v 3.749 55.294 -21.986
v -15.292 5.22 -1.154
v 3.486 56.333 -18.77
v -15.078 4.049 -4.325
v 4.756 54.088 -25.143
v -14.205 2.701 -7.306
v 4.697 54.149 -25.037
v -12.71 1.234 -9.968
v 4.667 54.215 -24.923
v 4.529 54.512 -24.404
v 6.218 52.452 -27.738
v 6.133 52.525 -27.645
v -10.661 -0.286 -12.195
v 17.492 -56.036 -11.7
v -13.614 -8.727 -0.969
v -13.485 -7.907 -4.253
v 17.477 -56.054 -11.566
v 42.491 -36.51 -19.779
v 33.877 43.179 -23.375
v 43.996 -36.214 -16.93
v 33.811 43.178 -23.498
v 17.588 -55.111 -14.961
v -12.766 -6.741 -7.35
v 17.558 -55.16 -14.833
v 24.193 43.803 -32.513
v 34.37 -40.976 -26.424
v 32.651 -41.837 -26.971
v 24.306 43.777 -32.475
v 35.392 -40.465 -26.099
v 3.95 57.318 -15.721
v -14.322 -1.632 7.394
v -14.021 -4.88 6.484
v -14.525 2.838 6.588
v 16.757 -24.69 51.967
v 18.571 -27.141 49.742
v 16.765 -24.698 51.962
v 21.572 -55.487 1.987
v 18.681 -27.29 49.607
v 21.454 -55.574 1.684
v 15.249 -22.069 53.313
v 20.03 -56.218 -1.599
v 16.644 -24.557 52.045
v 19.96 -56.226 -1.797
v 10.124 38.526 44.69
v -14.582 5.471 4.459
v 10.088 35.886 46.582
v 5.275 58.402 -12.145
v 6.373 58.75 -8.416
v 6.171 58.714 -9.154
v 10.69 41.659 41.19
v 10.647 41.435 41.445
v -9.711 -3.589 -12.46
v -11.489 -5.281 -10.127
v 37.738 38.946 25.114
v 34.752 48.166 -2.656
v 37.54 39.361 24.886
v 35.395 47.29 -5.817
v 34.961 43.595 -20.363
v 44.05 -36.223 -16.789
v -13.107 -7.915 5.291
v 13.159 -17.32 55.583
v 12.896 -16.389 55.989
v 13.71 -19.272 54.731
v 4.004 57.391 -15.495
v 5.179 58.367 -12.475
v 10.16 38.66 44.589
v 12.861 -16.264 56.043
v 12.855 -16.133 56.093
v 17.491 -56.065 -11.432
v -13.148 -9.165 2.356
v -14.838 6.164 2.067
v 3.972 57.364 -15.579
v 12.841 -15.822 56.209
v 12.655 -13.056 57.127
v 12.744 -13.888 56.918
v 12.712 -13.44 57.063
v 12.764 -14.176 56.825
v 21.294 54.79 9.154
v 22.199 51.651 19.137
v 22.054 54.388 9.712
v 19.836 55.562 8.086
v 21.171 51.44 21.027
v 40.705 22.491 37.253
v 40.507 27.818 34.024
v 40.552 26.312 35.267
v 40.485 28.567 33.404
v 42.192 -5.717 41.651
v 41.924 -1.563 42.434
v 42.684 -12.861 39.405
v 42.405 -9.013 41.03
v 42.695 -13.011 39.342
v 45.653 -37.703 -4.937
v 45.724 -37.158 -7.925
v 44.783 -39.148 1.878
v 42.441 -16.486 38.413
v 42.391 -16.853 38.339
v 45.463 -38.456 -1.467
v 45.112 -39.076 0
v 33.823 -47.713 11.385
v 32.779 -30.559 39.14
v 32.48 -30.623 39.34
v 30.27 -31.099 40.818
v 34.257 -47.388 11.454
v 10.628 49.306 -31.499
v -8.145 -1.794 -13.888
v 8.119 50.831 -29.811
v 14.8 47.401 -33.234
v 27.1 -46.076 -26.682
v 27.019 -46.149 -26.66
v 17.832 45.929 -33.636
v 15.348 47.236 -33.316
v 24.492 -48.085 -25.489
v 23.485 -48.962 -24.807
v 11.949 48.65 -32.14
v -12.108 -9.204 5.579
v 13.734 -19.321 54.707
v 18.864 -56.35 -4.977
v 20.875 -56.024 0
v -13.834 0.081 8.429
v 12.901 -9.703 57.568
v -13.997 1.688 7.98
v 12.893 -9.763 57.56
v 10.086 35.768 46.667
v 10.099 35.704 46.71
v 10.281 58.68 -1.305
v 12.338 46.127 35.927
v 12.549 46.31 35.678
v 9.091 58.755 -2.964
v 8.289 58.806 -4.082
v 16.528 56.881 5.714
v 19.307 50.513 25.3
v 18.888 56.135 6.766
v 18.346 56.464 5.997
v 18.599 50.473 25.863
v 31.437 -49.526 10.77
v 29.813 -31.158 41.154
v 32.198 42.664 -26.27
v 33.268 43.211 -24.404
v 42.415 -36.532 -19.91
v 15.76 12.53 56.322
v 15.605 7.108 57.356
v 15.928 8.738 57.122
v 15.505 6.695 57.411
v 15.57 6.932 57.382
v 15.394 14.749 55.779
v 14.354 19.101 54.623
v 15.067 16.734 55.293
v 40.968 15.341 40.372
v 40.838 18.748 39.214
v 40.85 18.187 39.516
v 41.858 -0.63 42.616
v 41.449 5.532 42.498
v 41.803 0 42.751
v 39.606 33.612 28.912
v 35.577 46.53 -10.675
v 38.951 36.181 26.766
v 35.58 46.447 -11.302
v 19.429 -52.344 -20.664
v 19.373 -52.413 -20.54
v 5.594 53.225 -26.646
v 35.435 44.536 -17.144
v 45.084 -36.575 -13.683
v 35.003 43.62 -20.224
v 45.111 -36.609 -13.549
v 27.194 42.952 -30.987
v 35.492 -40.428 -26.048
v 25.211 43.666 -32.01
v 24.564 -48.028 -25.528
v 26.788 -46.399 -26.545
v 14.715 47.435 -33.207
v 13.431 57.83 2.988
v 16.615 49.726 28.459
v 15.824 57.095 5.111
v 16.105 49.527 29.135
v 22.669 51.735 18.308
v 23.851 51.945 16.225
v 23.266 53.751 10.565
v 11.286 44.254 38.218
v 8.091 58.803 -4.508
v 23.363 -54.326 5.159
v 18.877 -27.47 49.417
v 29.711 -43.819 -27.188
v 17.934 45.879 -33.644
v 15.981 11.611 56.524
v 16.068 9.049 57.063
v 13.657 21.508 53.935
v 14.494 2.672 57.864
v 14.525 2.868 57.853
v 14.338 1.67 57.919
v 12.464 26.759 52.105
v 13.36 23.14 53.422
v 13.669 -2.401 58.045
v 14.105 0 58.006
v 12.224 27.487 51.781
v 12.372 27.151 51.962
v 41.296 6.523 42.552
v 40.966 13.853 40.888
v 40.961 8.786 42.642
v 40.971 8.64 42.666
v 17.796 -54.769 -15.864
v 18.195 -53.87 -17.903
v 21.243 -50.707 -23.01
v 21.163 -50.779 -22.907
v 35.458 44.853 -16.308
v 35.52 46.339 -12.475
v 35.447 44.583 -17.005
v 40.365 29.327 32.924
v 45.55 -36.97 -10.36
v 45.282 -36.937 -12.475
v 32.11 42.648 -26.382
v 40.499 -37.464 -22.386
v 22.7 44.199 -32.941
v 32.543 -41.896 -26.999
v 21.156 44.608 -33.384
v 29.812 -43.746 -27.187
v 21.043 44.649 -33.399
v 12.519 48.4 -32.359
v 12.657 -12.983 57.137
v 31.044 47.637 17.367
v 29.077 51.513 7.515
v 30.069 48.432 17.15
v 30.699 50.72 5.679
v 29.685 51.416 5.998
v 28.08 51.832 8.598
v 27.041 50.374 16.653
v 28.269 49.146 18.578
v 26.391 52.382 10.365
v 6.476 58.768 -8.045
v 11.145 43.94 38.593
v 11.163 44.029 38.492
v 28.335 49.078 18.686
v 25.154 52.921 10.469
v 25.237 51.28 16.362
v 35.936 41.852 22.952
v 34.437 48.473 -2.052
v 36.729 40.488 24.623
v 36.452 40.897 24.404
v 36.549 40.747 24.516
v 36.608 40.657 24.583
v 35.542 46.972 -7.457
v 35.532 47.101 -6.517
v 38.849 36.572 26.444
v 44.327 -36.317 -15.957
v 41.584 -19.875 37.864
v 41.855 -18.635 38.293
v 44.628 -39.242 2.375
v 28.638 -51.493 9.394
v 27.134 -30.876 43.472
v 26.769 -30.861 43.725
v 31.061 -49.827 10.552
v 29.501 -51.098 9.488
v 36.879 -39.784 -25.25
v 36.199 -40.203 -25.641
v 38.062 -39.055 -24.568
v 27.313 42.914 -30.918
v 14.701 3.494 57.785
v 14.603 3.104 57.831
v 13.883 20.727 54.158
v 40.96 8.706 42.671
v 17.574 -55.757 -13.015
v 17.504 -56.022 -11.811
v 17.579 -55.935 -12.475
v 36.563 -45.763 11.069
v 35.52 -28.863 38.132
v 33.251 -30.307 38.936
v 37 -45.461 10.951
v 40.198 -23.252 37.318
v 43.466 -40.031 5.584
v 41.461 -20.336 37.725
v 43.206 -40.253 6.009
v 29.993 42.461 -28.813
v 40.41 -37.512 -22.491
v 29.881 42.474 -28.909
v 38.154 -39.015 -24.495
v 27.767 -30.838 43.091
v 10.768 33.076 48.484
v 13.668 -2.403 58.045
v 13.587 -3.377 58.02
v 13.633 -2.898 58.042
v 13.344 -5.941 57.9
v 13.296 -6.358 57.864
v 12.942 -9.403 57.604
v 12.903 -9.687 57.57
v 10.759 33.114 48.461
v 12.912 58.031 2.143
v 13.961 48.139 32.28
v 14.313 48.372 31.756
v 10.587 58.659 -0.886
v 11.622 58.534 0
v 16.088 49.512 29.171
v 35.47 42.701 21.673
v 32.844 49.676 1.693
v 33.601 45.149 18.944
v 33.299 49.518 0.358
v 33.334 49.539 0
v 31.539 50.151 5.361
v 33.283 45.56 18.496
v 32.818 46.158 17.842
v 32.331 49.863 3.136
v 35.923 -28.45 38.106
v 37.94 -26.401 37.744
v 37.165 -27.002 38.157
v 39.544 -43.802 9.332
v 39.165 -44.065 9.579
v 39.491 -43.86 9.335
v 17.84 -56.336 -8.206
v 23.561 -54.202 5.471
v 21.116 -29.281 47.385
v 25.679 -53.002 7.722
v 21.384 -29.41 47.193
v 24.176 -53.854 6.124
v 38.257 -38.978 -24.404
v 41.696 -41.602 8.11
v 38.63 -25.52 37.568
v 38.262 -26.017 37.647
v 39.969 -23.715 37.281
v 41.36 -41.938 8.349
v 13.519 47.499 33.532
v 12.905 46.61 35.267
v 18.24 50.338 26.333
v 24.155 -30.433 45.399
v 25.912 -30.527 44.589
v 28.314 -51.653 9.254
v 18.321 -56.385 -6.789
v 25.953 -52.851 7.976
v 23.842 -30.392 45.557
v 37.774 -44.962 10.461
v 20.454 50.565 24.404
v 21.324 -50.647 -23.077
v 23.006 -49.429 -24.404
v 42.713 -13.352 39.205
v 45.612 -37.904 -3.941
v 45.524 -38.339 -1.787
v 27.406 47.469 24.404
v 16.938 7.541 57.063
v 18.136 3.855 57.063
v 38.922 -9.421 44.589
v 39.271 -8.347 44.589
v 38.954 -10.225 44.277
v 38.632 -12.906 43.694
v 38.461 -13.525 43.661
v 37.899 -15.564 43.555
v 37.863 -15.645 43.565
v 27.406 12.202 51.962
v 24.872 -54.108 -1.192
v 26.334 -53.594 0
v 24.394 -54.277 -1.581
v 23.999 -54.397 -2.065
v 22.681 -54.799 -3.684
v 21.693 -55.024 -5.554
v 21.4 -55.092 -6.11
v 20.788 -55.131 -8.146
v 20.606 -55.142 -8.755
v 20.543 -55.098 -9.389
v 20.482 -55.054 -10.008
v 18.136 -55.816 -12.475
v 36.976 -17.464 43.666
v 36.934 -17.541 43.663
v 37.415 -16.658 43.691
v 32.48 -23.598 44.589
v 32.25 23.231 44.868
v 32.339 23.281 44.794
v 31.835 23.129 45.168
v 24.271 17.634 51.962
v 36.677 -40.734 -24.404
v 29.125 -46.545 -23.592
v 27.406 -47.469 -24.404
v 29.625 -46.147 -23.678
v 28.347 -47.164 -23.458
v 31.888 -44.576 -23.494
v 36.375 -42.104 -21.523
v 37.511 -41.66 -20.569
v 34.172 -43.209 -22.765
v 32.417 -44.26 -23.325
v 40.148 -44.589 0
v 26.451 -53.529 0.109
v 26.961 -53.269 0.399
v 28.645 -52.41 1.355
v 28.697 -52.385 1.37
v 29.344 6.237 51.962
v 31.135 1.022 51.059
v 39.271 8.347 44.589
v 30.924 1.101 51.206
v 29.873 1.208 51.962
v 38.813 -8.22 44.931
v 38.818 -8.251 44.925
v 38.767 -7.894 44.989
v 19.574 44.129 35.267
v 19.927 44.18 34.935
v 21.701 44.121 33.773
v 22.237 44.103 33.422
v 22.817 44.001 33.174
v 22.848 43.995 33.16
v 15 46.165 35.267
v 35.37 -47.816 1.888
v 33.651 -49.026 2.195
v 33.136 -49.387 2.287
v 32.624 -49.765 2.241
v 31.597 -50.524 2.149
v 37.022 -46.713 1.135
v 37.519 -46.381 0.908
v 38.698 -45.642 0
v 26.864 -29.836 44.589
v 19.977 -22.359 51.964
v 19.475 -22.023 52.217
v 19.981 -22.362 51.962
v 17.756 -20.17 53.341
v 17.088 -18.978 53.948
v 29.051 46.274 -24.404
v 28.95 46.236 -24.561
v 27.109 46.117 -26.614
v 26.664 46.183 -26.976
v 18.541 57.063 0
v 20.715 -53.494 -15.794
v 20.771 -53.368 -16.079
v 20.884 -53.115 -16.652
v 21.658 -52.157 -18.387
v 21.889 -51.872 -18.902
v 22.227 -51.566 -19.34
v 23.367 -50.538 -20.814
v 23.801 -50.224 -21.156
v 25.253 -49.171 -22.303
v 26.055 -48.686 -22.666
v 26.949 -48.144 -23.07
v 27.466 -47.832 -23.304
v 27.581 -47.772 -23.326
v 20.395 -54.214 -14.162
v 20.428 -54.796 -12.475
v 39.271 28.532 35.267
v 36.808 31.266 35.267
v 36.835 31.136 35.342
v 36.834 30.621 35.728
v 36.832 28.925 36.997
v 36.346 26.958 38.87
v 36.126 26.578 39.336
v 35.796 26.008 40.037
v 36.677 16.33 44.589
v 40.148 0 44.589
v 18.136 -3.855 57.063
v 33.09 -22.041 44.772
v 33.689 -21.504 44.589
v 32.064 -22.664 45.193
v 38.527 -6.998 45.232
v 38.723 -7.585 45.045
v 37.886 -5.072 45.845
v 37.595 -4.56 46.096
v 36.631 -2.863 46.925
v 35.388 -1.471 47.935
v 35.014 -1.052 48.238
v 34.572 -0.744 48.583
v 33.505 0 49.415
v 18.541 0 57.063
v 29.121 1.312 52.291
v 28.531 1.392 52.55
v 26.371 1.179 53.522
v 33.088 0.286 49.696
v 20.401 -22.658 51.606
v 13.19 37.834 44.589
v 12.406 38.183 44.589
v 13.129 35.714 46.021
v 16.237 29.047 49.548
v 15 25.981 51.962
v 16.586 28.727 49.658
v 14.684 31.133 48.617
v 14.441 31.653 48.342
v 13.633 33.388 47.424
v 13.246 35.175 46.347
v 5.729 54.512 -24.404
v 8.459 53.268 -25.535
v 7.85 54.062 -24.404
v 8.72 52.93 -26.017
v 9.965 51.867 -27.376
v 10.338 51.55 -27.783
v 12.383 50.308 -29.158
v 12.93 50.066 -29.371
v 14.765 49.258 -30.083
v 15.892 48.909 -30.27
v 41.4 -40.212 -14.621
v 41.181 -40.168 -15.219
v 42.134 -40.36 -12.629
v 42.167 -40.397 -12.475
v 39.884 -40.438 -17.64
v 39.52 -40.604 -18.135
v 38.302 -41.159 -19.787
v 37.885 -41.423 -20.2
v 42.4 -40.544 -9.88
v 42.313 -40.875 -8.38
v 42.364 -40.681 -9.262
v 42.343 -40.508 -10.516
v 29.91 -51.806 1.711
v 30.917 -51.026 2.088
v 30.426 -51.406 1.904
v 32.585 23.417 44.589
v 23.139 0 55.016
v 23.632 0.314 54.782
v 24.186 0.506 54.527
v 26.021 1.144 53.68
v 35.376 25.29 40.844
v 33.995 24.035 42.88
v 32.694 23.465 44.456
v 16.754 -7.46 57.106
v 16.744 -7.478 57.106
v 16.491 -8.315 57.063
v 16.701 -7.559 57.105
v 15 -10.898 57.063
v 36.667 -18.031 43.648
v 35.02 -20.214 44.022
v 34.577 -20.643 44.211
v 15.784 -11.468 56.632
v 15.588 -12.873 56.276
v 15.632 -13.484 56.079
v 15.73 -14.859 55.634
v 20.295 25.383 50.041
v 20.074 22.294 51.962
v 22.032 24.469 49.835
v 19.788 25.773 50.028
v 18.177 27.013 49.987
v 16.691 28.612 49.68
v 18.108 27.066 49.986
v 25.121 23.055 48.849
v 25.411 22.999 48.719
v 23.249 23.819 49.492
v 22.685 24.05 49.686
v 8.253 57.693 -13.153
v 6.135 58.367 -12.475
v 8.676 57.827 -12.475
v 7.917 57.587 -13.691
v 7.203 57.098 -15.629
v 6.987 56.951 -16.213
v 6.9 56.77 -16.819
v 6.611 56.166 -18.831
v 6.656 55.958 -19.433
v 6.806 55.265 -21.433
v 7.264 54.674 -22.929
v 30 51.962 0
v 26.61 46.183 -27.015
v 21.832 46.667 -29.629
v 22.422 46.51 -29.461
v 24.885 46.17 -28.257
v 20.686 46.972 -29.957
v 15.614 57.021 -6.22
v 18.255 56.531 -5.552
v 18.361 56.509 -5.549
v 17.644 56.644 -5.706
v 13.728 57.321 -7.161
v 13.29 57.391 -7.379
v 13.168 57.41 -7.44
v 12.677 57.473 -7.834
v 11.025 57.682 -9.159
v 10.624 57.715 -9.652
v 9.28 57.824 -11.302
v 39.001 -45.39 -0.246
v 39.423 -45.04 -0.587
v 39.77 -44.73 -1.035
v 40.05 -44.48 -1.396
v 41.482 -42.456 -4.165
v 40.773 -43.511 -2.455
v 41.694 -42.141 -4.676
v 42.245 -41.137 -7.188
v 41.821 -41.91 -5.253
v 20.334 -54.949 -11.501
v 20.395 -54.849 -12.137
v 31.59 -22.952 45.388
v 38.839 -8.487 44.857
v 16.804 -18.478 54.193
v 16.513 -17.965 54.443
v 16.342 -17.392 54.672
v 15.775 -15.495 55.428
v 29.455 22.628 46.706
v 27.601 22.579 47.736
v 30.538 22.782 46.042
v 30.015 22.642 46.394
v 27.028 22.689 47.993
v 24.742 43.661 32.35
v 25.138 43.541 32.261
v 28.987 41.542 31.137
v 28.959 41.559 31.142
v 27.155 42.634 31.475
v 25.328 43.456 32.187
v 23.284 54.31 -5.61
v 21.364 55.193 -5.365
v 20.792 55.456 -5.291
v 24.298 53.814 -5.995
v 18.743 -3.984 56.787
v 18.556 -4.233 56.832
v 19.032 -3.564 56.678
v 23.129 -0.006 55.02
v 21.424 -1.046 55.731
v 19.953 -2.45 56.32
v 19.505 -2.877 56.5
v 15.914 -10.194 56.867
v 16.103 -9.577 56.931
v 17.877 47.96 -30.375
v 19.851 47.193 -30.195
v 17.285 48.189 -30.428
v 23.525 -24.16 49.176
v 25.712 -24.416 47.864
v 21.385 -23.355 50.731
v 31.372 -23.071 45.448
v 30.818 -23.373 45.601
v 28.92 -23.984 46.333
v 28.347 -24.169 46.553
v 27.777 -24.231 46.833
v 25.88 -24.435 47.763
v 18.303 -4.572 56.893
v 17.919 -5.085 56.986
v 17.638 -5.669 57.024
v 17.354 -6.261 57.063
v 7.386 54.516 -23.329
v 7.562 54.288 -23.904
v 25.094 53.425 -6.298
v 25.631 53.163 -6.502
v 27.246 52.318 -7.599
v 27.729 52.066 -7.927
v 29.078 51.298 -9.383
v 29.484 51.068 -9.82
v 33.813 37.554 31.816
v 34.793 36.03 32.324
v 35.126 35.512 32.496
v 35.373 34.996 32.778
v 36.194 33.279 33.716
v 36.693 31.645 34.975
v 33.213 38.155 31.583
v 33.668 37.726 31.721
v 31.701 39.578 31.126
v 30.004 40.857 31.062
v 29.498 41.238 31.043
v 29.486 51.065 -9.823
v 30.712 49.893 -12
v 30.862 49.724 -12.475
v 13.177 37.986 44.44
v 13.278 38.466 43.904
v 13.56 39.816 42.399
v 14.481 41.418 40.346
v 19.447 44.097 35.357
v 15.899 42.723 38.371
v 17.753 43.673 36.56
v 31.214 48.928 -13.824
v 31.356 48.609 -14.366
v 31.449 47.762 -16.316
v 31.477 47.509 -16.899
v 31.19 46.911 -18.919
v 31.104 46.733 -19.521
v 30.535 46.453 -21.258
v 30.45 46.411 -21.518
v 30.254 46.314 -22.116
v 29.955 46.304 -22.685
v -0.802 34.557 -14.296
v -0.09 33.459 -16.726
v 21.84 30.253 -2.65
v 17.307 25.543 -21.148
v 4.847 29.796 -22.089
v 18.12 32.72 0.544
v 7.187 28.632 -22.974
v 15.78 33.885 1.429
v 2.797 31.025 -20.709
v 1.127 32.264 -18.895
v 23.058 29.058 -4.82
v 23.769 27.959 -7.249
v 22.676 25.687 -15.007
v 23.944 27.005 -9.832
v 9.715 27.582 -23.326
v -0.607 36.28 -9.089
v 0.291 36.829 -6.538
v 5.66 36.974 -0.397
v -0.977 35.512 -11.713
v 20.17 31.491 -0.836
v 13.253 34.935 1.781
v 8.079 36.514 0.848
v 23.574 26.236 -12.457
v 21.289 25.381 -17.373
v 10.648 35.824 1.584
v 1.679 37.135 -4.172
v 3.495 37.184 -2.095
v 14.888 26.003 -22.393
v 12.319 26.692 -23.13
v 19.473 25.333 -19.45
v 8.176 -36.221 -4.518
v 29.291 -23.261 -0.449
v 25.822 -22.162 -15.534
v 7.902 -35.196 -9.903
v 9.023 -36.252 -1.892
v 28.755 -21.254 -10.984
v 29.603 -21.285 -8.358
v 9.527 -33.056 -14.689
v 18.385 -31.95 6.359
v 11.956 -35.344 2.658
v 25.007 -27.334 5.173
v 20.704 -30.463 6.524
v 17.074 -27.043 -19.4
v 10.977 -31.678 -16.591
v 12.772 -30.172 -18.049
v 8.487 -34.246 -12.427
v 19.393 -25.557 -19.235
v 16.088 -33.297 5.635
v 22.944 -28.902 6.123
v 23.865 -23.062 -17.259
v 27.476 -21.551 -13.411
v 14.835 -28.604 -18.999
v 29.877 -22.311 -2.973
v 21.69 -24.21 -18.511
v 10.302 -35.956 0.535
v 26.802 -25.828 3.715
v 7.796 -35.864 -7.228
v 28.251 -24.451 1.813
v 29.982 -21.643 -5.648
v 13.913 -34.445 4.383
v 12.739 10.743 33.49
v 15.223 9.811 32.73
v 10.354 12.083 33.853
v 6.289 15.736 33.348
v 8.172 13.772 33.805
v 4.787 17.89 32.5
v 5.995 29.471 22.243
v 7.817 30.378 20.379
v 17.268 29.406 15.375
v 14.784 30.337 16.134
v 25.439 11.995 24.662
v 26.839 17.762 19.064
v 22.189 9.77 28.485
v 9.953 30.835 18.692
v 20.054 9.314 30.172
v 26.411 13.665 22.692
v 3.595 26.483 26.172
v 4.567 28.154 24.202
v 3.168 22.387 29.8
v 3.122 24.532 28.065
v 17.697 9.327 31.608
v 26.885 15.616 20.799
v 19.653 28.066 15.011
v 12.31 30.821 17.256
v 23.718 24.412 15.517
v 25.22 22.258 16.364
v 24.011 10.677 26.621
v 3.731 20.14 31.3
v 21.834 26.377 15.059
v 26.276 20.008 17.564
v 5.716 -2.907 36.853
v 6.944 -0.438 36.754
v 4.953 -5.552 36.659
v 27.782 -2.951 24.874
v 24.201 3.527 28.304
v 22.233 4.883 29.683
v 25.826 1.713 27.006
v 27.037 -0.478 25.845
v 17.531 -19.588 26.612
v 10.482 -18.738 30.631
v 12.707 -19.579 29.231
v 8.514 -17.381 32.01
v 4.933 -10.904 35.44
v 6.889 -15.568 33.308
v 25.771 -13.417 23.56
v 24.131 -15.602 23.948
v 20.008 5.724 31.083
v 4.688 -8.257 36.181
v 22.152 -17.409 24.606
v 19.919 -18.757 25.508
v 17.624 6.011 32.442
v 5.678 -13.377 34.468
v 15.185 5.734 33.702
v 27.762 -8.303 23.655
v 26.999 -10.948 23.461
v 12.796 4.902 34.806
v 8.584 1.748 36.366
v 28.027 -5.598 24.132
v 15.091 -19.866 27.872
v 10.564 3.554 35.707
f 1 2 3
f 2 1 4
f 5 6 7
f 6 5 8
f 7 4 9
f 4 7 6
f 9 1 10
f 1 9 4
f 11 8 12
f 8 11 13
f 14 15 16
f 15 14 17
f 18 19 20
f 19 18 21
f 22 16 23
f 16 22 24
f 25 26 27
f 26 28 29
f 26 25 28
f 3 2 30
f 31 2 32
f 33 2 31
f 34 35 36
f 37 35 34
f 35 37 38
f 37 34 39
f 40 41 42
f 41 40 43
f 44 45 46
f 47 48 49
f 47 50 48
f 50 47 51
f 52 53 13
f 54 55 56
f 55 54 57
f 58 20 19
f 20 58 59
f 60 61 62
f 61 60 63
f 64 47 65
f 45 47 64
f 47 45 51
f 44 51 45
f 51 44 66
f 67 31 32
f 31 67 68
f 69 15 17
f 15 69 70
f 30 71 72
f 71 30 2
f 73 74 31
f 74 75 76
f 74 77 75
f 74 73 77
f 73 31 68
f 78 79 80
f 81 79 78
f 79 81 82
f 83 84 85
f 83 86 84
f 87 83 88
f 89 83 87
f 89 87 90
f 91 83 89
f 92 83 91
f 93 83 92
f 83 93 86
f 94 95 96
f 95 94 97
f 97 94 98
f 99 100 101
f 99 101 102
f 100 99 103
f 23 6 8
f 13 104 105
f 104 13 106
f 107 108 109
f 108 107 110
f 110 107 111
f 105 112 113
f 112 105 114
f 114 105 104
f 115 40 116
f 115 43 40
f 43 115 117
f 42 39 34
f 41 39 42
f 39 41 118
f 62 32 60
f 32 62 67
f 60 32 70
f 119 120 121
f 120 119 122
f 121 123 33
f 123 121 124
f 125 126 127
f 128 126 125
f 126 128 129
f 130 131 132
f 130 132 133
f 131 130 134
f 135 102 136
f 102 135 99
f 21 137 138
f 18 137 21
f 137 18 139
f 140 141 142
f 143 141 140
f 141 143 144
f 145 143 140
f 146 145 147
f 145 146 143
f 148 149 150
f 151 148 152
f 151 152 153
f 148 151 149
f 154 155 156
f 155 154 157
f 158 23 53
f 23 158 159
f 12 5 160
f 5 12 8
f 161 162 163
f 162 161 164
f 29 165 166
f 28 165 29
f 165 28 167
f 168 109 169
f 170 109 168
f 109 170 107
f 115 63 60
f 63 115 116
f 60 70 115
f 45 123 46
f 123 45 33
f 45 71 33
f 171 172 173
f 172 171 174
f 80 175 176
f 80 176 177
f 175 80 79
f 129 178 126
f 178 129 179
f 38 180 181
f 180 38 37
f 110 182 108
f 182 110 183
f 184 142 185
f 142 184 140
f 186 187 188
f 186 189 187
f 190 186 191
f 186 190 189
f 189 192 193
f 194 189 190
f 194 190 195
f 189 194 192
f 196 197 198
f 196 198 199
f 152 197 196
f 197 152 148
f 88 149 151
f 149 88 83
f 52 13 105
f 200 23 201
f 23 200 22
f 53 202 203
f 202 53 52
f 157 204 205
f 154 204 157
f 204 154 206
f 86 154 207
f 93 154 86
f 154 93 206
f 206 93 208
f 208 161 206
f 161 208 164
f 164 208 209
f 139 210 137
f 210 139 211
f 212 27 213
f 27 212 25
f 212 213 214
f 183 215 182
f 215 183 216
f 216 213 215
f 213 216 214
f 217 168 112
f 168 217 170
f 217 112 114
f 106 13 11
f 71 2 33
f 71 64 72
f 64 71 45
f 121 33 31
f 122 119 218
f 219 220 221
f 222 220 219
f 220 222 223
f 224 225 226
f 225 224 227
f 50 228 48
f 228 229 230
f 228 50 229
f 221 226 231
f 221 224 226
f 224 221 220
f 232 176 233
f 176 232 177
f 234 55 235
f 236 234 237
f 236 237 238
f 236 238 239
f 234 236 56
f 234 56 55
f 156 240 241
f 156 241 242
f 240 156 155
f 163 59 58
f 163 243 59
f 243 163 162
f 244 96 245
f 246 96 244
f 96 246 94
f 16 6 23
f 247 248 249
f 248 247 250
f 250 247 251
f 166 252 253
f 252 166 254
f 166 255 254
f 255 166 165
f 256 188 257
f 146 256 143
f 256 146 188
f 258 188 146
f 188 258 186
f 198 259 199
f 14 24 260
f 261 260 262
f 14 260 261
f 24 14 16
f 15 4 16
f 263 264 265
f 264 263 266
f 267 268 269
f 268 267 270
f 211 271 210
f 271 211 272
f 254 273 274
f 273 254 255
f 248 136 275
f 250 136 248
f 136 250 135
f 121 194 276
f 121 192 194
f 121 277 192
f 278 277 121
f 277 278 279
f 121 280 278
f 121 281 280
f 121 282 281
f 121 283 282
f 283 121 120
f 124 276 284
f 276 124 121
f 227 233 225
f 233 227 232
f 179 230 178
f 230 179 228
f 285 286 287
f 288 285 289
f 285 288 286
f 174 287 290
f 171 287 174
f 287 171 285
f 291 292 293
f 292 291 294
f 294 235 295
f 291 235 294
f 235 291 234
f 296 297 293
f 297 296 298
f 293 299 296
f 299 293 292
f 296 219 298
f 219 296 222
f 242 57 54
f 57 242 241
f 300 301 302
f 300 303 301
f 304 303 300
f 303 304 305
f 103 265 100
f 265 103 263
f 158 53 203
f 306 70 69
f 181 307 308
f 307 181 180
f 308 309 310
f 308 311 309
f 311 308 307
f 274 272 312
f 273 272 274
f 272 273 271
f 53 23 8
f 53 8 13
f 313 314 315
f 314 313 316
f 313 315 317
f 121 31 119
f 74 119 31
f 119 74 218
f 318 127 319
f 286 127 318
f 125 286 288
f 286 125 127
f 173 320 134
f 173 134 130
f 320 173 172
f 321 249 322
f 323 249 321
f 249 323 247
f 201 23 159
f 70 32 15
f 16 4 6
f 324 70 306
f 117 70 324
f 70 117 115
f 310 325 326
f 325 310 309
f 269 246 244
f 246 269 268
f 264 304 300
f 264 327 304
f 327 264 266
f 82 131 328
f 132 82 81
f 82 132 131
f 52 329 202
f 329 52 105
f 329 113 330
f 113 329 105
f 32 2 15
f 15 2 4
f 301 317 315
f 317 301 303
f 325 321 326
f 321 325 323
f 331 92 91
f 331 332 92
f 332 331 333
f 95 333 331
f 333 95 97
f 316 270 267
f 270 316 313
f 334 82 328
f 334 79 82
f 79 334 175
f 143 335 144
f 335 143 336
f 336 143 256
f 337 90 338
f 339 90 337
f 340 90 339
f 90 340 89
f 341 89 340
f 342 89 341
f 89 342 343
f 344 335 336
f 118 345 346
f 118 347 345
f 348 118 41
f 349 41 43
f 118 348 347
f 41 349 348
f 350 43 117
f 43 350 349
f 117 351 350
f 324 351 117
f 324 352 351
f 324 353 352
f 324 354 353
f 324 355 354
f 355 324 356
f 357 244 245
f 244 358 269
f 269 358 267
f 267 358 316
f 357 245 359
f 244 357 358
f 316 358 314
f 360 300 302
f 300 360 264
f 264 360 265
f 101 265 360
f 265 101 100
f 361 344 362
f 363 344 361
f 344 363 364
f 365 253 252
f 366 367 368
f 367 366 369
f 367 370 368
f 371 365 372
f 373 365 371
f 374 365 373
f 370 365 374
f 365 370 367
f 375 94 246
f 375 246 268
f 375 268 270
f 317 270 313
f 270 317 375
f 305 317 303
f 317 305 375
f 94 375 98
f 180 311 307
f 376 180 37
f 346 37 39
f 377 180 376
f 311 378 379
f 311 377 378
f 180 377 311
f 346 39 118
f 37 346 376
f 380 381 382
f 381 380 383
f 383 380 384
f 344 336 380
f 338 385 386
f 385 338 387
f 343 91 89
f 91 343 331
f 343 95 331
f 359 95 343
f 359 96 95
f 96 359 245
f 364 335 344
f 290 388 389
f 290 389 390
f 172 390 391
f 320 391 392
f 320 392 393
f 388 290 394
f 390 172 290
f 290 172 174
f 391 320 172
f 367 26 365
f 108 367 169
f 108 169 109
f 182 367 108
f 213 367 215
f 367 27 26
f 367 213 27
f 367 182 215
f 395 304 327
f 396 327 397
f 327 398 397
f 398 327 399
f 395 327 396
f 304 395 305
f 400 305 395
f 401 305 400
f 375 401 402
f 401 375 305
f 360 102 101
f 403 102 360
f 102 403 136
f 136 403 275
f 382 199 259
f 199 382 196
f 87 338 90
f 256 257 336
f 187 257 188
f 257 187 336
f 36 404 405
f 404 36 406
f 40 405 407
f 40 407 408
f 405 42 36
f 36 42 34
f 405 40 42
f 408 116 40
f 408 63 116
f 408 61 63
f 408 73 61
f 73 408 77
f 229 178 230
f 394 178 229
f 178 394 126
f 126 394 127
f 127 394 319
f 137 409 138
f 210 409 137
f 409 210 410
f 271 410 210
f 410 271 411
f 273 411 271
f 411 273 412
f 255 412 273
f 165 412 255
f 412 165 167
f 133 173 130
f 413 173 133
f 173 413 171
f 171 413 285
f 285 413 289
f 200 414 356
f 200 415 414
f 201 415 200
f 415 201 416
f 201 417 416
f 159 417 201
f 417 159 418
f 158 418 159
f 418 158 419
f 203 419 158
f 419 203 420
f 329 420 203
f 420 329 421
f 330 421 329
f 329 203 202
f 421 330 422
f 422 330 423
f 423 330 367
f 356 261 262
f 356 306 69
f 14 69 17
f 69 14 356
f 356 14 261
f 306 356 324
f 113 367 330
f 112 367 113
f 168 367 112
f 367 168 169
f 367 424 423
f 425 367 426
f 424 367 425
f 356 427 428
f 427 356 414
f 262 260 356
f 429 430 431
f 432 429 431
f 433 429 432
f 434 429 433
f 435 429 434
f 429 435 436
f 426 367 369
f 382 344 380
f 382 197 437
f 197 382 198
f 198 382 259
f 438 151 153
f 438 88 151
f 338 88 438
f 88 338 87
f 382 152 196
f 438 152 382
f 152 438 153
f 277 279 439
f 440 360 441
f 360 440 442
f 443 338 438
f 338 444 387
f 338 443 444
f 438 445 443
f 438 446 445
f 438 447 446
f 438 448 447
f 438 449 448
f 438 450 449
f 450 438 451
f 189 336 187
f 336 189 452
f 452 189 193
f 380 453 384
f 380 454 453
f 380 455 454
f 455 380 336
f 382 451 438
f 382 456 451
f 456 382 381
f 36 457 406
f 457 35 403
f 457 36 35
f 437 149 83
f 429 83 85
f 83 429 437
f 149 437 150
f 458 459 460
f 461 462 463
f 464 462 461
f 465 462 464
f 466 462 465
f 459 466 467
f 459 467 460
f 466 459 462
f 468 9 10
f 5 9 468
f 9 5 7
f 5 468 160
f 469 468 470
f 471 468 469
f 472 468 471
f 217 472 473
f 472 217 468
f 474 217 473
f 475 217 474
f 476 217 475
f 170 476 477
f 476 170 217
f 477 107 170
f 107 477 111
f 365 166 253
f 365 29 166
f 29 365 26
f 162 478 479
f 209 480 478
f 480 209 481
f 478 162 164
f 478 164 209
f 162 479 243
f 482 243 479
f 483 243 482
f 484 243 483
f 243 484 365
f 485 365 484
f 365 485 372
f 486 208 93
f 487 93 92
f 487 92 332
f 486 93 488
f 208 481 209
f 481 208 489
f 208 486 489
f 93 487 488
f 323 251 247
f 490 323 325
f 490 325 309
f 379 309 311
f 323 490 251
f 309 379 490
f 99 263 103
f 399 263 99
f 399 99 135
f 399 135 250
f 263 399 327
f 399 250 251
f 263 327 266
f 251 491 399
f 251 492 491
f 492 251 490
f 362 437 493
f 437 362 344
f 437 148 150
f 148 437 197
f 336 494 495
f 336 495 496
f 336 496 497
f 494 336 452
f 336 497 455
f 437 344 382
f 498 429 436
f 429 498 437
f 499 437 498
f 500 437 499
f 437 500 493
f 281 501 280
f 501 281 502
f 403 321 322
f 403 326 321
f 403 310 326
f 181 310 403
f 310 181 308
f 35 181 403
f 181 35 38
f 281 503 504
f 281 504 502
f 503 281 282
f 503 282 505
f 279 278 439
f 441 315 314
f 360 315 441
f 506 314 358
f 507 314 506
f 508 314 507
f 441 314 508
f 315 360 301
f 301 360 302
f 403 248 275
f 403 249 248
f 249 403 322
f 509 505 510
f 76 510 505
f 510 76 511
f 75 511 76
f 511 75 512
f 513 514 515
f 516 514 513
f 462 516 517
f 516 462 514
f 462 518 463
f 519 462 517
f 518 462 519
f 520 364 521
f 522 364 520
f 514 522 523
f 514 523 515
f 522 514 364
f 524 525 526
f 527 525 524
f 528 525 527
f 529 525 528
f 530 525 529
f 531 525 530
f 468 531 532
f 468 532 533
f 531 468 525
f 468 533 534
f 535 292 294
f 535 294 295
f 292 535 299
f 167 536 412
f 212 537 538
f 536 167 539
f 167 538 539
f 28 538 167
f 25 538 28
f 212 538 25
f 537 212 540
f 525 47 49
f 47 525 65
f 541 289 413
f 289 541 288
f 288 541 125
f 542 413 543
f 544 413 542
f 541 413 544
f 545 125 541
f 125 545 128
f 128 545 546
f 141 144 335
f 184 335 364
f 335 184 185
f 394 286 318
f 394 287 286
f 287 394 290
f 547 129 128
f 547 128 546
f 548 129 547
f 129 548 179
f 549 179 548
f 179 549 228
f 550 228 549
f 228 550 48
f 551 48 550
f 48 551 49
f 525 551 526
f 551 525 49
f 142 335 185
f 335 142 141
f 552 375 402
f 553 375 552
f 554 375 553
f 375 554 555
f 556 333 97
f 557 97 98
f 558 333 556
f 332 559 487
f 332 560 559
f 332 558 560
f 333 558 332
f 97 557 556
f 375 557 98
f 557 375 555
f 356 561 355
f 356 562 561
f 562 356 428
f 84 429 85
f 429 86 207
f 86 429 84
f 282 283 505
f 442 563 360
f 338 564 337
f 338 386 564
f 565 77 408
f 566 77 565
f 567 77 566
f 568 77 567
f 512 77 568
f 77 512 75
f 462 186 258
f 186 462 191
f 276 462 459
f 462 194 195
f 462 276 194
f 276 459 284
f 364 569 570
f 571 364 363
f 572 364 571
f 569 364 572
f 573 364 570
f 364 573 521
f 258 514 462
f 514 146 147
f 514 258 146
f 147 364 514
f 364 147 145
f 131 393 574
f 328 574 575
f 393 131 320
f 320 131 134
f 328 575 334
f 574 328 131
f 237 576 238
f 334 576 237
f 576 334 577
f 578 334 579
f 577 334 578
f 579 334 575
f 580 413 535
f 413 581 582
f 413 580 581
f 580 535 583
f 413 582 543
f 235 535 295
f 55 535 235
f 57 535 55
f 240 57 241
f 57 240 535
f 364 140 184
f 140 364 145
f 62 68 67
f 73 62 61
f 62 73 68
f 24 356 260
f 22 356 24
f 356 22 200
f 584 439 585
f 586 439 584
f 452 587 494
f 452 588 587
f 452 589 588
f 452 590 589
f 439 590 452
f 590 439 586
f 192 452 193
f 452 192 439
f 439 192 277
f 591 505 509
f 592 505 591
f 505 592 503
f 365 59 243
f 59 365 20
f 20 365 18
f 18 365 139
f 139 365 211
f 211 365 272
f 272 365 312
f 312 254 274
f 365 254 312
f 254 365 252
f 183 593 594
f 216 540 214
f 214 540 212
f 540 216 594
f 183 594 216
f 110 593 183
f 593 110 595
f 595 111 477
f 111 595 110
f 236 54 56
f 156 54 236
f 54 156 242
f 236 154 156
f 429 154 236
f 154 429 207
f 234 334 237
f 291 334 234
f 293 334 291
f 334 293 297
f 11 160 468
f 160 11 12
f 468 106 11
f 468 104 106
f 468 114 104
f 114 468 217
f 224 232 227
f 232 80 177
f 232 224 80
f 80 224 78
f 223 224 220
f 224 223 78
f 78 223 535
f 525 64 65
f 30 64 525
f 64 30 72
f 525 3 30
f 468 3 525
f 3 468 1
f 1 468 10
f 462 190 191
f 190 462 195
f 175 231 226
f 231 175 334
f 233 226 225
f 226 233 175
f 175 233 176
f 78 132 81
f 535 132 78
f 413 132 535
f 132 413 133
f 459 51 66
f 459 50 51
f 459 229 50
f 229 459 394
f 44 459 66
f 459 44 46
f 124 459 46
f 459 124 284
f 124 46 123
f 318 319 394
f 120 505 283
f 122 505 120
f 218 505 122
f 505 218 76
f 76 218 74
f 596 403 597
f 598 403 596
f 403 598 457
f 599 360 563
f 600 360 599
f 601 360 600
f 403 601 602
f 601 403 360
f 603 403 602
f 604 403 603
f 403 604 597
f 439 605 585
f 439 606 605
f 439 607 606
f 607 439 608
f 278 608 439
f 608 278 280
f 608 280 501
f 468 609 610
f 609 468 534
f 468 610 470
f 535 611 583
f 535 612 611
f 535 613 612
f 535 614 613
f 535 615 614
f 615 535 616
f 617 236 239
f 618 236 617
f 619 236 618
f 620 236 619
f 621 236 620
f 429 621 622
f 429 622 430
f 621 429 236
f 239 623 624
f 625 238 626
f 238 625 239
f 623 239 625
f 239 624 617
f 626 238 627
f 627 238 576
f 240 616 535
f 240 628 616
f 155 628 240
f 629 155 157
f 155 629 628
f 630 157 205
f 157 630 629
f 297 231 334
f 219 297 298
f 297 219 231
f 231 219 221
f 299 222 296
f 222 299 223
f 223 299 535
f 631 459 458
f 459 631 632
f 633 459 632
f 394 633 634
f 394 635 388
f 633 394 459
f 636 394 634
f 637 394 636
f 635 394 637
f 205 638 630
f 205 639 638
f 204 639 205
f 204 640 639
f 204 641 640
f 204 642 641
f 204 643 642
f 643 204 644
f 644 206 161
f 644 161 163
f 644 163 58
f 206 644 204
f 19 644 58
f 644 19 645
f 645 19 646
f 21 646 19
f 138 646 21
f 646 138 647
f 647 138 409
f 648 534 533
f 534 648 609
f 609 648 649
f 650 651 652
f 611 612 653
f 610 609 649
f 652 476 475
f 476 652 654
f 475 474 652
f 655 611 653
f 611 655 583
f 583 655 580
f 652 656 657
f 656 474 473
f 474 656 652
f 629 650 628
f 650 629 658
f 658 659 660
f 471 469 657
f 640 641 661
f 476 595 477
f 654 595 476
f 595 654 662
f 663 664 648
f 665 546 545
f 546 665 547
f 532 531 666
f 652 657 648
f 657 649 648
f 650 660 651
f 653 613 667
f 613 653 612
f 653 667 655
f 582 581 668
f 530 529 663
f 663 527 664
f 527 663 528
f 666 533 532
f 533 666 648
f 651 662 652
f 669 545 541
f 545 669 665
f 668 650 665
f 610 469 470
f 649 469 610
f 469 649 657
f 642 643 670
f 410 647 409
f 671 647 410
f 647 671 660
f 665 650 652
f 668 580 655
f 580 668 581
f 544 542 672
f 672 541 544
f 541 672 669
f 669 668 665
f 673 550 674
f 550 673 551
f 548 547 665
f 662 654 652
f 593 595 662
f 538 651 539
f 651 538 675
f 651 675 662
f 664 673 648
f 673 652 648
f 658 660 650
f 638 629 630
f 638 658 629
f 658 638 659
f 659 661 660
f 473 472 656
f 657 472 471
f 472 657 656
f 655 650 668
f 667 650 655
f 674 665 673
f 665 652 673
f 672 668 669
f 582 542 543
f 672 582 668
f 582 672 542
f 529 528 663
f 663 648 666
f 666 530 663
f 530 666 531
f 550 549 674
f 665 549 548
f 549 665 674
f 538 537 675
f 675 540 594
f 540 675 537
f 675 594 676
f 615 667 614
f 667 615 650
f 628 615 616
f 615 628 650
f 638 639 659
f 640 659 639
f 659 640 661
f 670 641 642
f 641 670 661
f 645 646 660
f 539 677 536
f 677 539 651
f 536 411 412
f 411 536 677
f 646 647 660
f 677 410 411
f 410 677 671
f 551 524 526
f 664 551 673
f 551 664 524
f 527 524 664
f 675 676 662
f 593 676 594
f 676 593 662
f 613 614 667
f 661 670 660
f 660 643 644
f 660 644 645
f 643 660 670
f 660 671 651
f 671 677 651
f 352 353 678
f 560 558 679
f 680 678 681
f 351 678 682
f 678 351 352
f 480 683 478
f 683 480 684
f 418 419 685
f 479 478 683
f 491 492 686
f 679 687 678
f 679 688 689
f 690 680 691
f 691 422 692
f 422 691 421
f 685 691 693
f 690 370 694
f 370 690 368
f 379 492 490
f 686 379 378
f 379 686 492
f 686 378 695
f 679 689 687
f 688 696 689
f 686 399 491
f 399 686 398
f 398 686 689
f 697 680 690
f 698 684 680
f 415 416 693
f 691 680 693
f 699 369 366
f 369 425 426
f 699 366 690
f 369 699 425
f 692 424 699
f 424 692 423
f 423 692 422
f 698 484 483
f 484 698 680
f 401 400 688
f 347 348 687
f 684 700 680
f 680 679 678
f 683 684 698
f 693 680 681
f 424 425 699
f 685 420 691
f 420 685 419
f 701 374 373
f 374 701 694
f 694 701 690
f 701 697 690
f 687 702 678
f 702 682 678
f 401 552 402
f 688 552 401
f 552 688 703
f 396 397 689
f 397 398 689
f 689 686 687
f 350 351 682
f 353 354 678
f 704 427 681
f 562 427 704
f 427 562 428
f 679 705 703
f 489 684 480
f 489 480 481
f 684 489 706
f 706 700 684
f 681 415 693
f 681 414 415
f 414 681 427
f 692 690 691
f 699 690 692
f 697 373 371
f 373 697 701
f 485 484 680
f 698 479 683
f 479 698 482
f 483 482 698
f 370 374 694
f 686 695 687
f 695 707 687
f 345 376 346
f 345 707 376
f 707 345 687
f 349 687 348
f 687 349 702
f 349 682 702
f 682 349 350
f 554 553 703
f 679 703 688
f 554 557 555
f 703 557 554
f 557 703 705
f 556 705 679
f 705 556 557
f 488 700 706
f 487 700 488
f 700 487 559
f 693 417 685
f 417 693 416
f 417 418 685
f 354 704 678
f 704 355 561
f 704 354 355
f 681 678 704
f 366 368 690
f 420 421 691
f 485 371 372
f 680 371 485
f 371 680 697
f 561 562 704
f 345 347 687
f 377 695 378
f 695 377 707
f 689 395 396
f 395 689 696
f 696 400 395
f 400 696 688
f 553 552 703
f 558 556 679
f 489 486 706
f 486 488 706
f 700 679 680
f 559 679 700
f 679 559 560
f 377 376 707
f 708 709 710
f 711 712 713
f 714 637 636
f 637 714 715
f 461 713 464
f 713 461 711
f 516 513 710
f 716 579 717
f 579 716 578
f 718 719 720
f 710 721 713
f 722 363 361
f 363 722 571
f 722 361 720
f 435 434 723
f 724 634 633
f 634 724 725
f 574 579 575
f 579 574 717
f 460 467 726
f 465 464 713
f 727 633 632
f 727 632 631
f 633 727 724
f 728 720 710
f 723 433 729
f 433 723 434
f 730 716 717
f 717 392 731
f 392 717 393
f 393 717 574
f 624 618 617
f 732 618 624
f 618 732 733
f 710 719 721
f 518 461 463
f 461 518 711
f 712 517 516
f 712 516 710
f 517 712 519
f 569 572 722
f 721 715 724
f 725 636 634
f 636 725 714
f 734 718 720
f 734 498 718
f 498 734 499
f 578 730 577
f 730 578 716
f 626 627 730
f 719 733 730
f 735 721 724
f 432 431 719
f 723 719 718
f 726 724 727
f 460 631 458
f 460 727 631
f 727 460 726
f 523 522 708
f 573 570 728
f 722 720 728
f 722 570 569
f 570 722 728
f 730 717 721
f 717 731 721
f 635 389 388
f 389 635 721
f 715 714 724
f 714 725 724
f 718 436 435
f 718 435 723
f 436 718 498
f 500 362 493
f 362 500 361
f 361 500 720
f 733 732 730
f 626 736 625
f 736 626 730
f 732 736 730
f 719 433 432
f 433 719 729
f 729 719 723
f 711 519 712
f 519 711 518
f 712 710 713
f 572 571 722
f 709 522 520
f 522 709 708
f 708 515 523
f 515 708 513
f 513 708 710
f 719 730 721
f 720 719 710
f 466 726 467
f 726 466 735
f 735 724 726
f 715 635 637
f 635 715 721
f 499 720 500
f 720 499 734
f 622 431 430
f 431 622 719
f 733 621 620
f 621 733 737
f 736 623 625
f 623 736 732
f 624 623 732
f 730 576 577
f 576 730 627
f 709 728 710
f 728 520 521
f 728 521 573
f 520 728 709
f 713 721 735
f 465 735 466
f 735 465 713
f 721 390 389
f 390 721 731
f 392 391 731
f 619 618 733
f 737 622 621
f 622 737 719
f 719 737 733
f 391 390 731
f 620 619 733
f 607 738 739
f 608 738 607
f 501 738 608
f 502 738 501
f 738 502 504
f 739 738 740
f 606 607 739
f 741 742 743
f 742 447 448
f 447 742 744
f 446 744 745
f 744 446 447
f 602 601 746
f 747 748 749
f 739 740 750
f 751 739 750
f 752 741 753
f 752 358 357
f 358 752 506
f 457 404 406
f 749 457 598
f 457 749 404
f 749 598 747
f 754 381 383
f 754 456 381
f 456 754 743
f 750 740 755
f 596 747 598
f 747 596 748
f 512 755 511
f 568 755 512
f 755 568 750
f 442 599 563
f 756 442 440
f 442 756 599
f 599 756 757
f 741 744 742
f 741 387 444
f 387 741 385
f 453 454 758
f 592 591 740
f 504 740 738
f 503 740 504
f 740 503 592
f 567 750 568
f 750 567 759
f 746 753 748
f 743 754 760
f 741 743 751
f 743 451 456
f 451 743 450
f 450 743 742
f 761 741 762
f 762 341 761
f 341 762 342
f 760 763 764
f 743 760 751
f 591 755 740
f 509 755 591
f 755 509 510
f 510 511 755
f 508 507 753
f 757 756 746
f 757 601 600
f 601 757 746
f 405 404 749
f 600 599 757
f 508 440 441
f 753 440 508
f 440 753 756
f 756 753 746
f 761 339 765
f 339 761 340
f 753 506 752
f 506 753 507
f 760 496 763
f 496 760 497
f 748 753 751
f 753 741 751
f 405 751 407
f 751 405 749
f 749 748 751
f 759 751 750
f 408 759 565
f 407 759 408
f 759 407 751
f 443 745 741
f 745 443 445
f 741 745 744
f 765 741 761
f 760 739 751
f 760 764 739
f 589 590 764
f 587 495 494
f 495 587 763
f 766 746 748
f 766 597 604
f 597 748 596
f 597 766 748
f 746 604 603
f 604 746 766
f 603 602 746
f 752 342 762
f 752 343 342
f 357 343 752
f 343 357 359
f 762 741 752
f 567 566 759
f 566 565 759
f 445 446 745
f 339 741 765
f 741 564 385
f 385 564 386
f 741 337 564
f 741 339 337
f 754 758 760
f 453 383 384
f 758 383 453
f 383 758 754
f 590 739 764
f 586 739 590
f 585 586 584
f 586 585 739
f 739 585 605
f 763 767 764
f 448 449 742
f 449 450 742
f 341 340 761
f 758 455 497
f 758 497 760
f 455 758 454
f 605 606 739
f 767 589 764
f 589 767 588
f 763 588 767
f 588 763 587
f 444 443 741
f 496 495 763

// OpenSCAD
difference() {
	intersection() {
		hull() {
			rotate(a = -150.2044300830, v = [-0.1221199000, 0.4816670653, 0.0000000000]) {
				rotate(a = -90.0000000000, v = [0.6087614290, 0.7933533403, -0.0000000000]) {
					cylinder(h = 60, r = 16.2000000000);
				}
			}
			rotate(a = -150.2044300830, v = [-0.1221199000, 0.4816670653, 0.0000000000]) {
				rotate(a = -90.0000000000, v = [-0.9914448614, 0.1305261922, 0.0000000000]) {
					cylinder(h = 60, r = 16.2000000000);
				}
			}
			rotate(a = -150.2044300830, v = [-0.1221199000, 0.4816670653, 0.0000000000]) {
				rotate(a = -151.9205722594, v = [0.4033545694, 0.2426087124, -0.0000000000]) {
					cylinder(h = 60, r = 16.2000000000);
				}
			}
			rotate(a = -150.2044300830, v = [-0.1221199000, 0.4816670653, 0.0000000000]) {
				rotate(a = -161.5616070448, v = [-0.2783292144, -0.1502295517, 0.0000000000]) {
					cylinder(h = 60, r = 16.2000000000);
				}
			}
		}
		sphere(r = 60);
	}
	union() {
		rotate(a = -150.2044300830, v = [-0.1221199000, 0.4816670653, 0.0000000000]) {
			rotate(a = -90.0000000000, v = [0.6087614290, 0.7933533403, -0.0000000000]) {
				translate(v = [0, 0, 35]) {
					cylinder(h = 100, r = 13.2000000000);
				}
			}
		}
		rotate(a = -150.2044300830, v = [-0.1221199000, 0.4816670653, 0.0000000000]) {
			rotate(a = -90.0000000000, v = [-0.9914448614, 0.1305261922, 0.0000000000]) {
				translate(v = [0, 0, 35]) {
					cylinder(h = 100, r = 13.2000000000);
				}
			}
		}
		rotate(a = -150.2044300830, v = [-0.1221199000, 0.4816670653, 0.0000000000]) {
			rotate(a = -151.9205722594, v = [0.4033545694, 0.2426087124, -0.0000000000]) {
				translate(v = [0, 0, 35]) {
					cylinder(h = 100, r = 13.2000000000);
				}
			}
		}
		rotate(a = -150.2044300830, v = [-0.1221199000, 0.4816670653, 0.0000000000]) {
			rotate(a = -161.5616070448, v = [-0.2783292144, -0.1502295517, 0.0000000000]) {
				translate(v = [0, 0, 35]) {
					cylinder(h = 100, r = 13.2000000000);
				}
			}
		}
	}
}
